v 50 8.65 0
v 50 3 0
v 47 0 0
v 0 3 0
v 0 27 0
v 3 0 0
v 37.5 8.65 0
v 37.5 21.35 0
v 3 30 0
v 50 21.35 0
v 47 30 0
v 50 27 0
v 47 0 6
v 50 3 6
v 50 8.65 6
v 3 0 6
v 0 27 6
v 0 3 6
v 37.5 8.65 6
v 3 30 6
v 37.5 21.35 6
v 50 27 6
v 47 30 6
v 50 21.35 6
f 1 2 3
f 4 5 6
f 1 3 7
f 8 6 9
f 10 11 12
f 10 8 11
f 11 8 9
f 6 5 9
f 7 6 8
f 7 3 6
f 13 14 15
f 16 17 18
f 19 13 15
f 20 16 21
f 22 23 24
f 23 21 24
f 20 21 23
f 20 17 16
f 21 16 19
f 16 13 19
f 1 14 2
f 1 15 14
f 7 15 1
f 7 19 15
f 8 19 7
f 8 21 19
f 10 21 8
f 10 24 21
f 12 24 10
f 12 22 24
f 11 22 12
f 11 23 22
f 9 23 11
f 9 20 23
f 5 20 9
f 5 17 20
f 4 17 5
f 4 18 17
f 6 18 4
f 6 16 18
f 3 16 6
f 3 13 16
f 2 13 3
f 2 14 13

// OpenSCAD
$fn = 32;

// ----------------------------------------------------------------------
// C washer: 50 x 30 mm plate with an open slot
// ----------------------------------------------------------------------

// --- parameters (mm) ---
profile_height = 6;       // extrusion height
profile_points = 12;      // points of the closed outline

profile = [[3, 0], [47, 0], [50, 3], [50, 8.65], [37.5, 8.65], [37.5, 21.35], [50, 21.35], [50, 27], [47, 30], [3, 30], [0, 27], [0, 3]];  // single closed polygon, 12 points, counter clockwise

// --- the one profile operation ---
linear_extrude(height = profile_height) polygon(points = profile);
